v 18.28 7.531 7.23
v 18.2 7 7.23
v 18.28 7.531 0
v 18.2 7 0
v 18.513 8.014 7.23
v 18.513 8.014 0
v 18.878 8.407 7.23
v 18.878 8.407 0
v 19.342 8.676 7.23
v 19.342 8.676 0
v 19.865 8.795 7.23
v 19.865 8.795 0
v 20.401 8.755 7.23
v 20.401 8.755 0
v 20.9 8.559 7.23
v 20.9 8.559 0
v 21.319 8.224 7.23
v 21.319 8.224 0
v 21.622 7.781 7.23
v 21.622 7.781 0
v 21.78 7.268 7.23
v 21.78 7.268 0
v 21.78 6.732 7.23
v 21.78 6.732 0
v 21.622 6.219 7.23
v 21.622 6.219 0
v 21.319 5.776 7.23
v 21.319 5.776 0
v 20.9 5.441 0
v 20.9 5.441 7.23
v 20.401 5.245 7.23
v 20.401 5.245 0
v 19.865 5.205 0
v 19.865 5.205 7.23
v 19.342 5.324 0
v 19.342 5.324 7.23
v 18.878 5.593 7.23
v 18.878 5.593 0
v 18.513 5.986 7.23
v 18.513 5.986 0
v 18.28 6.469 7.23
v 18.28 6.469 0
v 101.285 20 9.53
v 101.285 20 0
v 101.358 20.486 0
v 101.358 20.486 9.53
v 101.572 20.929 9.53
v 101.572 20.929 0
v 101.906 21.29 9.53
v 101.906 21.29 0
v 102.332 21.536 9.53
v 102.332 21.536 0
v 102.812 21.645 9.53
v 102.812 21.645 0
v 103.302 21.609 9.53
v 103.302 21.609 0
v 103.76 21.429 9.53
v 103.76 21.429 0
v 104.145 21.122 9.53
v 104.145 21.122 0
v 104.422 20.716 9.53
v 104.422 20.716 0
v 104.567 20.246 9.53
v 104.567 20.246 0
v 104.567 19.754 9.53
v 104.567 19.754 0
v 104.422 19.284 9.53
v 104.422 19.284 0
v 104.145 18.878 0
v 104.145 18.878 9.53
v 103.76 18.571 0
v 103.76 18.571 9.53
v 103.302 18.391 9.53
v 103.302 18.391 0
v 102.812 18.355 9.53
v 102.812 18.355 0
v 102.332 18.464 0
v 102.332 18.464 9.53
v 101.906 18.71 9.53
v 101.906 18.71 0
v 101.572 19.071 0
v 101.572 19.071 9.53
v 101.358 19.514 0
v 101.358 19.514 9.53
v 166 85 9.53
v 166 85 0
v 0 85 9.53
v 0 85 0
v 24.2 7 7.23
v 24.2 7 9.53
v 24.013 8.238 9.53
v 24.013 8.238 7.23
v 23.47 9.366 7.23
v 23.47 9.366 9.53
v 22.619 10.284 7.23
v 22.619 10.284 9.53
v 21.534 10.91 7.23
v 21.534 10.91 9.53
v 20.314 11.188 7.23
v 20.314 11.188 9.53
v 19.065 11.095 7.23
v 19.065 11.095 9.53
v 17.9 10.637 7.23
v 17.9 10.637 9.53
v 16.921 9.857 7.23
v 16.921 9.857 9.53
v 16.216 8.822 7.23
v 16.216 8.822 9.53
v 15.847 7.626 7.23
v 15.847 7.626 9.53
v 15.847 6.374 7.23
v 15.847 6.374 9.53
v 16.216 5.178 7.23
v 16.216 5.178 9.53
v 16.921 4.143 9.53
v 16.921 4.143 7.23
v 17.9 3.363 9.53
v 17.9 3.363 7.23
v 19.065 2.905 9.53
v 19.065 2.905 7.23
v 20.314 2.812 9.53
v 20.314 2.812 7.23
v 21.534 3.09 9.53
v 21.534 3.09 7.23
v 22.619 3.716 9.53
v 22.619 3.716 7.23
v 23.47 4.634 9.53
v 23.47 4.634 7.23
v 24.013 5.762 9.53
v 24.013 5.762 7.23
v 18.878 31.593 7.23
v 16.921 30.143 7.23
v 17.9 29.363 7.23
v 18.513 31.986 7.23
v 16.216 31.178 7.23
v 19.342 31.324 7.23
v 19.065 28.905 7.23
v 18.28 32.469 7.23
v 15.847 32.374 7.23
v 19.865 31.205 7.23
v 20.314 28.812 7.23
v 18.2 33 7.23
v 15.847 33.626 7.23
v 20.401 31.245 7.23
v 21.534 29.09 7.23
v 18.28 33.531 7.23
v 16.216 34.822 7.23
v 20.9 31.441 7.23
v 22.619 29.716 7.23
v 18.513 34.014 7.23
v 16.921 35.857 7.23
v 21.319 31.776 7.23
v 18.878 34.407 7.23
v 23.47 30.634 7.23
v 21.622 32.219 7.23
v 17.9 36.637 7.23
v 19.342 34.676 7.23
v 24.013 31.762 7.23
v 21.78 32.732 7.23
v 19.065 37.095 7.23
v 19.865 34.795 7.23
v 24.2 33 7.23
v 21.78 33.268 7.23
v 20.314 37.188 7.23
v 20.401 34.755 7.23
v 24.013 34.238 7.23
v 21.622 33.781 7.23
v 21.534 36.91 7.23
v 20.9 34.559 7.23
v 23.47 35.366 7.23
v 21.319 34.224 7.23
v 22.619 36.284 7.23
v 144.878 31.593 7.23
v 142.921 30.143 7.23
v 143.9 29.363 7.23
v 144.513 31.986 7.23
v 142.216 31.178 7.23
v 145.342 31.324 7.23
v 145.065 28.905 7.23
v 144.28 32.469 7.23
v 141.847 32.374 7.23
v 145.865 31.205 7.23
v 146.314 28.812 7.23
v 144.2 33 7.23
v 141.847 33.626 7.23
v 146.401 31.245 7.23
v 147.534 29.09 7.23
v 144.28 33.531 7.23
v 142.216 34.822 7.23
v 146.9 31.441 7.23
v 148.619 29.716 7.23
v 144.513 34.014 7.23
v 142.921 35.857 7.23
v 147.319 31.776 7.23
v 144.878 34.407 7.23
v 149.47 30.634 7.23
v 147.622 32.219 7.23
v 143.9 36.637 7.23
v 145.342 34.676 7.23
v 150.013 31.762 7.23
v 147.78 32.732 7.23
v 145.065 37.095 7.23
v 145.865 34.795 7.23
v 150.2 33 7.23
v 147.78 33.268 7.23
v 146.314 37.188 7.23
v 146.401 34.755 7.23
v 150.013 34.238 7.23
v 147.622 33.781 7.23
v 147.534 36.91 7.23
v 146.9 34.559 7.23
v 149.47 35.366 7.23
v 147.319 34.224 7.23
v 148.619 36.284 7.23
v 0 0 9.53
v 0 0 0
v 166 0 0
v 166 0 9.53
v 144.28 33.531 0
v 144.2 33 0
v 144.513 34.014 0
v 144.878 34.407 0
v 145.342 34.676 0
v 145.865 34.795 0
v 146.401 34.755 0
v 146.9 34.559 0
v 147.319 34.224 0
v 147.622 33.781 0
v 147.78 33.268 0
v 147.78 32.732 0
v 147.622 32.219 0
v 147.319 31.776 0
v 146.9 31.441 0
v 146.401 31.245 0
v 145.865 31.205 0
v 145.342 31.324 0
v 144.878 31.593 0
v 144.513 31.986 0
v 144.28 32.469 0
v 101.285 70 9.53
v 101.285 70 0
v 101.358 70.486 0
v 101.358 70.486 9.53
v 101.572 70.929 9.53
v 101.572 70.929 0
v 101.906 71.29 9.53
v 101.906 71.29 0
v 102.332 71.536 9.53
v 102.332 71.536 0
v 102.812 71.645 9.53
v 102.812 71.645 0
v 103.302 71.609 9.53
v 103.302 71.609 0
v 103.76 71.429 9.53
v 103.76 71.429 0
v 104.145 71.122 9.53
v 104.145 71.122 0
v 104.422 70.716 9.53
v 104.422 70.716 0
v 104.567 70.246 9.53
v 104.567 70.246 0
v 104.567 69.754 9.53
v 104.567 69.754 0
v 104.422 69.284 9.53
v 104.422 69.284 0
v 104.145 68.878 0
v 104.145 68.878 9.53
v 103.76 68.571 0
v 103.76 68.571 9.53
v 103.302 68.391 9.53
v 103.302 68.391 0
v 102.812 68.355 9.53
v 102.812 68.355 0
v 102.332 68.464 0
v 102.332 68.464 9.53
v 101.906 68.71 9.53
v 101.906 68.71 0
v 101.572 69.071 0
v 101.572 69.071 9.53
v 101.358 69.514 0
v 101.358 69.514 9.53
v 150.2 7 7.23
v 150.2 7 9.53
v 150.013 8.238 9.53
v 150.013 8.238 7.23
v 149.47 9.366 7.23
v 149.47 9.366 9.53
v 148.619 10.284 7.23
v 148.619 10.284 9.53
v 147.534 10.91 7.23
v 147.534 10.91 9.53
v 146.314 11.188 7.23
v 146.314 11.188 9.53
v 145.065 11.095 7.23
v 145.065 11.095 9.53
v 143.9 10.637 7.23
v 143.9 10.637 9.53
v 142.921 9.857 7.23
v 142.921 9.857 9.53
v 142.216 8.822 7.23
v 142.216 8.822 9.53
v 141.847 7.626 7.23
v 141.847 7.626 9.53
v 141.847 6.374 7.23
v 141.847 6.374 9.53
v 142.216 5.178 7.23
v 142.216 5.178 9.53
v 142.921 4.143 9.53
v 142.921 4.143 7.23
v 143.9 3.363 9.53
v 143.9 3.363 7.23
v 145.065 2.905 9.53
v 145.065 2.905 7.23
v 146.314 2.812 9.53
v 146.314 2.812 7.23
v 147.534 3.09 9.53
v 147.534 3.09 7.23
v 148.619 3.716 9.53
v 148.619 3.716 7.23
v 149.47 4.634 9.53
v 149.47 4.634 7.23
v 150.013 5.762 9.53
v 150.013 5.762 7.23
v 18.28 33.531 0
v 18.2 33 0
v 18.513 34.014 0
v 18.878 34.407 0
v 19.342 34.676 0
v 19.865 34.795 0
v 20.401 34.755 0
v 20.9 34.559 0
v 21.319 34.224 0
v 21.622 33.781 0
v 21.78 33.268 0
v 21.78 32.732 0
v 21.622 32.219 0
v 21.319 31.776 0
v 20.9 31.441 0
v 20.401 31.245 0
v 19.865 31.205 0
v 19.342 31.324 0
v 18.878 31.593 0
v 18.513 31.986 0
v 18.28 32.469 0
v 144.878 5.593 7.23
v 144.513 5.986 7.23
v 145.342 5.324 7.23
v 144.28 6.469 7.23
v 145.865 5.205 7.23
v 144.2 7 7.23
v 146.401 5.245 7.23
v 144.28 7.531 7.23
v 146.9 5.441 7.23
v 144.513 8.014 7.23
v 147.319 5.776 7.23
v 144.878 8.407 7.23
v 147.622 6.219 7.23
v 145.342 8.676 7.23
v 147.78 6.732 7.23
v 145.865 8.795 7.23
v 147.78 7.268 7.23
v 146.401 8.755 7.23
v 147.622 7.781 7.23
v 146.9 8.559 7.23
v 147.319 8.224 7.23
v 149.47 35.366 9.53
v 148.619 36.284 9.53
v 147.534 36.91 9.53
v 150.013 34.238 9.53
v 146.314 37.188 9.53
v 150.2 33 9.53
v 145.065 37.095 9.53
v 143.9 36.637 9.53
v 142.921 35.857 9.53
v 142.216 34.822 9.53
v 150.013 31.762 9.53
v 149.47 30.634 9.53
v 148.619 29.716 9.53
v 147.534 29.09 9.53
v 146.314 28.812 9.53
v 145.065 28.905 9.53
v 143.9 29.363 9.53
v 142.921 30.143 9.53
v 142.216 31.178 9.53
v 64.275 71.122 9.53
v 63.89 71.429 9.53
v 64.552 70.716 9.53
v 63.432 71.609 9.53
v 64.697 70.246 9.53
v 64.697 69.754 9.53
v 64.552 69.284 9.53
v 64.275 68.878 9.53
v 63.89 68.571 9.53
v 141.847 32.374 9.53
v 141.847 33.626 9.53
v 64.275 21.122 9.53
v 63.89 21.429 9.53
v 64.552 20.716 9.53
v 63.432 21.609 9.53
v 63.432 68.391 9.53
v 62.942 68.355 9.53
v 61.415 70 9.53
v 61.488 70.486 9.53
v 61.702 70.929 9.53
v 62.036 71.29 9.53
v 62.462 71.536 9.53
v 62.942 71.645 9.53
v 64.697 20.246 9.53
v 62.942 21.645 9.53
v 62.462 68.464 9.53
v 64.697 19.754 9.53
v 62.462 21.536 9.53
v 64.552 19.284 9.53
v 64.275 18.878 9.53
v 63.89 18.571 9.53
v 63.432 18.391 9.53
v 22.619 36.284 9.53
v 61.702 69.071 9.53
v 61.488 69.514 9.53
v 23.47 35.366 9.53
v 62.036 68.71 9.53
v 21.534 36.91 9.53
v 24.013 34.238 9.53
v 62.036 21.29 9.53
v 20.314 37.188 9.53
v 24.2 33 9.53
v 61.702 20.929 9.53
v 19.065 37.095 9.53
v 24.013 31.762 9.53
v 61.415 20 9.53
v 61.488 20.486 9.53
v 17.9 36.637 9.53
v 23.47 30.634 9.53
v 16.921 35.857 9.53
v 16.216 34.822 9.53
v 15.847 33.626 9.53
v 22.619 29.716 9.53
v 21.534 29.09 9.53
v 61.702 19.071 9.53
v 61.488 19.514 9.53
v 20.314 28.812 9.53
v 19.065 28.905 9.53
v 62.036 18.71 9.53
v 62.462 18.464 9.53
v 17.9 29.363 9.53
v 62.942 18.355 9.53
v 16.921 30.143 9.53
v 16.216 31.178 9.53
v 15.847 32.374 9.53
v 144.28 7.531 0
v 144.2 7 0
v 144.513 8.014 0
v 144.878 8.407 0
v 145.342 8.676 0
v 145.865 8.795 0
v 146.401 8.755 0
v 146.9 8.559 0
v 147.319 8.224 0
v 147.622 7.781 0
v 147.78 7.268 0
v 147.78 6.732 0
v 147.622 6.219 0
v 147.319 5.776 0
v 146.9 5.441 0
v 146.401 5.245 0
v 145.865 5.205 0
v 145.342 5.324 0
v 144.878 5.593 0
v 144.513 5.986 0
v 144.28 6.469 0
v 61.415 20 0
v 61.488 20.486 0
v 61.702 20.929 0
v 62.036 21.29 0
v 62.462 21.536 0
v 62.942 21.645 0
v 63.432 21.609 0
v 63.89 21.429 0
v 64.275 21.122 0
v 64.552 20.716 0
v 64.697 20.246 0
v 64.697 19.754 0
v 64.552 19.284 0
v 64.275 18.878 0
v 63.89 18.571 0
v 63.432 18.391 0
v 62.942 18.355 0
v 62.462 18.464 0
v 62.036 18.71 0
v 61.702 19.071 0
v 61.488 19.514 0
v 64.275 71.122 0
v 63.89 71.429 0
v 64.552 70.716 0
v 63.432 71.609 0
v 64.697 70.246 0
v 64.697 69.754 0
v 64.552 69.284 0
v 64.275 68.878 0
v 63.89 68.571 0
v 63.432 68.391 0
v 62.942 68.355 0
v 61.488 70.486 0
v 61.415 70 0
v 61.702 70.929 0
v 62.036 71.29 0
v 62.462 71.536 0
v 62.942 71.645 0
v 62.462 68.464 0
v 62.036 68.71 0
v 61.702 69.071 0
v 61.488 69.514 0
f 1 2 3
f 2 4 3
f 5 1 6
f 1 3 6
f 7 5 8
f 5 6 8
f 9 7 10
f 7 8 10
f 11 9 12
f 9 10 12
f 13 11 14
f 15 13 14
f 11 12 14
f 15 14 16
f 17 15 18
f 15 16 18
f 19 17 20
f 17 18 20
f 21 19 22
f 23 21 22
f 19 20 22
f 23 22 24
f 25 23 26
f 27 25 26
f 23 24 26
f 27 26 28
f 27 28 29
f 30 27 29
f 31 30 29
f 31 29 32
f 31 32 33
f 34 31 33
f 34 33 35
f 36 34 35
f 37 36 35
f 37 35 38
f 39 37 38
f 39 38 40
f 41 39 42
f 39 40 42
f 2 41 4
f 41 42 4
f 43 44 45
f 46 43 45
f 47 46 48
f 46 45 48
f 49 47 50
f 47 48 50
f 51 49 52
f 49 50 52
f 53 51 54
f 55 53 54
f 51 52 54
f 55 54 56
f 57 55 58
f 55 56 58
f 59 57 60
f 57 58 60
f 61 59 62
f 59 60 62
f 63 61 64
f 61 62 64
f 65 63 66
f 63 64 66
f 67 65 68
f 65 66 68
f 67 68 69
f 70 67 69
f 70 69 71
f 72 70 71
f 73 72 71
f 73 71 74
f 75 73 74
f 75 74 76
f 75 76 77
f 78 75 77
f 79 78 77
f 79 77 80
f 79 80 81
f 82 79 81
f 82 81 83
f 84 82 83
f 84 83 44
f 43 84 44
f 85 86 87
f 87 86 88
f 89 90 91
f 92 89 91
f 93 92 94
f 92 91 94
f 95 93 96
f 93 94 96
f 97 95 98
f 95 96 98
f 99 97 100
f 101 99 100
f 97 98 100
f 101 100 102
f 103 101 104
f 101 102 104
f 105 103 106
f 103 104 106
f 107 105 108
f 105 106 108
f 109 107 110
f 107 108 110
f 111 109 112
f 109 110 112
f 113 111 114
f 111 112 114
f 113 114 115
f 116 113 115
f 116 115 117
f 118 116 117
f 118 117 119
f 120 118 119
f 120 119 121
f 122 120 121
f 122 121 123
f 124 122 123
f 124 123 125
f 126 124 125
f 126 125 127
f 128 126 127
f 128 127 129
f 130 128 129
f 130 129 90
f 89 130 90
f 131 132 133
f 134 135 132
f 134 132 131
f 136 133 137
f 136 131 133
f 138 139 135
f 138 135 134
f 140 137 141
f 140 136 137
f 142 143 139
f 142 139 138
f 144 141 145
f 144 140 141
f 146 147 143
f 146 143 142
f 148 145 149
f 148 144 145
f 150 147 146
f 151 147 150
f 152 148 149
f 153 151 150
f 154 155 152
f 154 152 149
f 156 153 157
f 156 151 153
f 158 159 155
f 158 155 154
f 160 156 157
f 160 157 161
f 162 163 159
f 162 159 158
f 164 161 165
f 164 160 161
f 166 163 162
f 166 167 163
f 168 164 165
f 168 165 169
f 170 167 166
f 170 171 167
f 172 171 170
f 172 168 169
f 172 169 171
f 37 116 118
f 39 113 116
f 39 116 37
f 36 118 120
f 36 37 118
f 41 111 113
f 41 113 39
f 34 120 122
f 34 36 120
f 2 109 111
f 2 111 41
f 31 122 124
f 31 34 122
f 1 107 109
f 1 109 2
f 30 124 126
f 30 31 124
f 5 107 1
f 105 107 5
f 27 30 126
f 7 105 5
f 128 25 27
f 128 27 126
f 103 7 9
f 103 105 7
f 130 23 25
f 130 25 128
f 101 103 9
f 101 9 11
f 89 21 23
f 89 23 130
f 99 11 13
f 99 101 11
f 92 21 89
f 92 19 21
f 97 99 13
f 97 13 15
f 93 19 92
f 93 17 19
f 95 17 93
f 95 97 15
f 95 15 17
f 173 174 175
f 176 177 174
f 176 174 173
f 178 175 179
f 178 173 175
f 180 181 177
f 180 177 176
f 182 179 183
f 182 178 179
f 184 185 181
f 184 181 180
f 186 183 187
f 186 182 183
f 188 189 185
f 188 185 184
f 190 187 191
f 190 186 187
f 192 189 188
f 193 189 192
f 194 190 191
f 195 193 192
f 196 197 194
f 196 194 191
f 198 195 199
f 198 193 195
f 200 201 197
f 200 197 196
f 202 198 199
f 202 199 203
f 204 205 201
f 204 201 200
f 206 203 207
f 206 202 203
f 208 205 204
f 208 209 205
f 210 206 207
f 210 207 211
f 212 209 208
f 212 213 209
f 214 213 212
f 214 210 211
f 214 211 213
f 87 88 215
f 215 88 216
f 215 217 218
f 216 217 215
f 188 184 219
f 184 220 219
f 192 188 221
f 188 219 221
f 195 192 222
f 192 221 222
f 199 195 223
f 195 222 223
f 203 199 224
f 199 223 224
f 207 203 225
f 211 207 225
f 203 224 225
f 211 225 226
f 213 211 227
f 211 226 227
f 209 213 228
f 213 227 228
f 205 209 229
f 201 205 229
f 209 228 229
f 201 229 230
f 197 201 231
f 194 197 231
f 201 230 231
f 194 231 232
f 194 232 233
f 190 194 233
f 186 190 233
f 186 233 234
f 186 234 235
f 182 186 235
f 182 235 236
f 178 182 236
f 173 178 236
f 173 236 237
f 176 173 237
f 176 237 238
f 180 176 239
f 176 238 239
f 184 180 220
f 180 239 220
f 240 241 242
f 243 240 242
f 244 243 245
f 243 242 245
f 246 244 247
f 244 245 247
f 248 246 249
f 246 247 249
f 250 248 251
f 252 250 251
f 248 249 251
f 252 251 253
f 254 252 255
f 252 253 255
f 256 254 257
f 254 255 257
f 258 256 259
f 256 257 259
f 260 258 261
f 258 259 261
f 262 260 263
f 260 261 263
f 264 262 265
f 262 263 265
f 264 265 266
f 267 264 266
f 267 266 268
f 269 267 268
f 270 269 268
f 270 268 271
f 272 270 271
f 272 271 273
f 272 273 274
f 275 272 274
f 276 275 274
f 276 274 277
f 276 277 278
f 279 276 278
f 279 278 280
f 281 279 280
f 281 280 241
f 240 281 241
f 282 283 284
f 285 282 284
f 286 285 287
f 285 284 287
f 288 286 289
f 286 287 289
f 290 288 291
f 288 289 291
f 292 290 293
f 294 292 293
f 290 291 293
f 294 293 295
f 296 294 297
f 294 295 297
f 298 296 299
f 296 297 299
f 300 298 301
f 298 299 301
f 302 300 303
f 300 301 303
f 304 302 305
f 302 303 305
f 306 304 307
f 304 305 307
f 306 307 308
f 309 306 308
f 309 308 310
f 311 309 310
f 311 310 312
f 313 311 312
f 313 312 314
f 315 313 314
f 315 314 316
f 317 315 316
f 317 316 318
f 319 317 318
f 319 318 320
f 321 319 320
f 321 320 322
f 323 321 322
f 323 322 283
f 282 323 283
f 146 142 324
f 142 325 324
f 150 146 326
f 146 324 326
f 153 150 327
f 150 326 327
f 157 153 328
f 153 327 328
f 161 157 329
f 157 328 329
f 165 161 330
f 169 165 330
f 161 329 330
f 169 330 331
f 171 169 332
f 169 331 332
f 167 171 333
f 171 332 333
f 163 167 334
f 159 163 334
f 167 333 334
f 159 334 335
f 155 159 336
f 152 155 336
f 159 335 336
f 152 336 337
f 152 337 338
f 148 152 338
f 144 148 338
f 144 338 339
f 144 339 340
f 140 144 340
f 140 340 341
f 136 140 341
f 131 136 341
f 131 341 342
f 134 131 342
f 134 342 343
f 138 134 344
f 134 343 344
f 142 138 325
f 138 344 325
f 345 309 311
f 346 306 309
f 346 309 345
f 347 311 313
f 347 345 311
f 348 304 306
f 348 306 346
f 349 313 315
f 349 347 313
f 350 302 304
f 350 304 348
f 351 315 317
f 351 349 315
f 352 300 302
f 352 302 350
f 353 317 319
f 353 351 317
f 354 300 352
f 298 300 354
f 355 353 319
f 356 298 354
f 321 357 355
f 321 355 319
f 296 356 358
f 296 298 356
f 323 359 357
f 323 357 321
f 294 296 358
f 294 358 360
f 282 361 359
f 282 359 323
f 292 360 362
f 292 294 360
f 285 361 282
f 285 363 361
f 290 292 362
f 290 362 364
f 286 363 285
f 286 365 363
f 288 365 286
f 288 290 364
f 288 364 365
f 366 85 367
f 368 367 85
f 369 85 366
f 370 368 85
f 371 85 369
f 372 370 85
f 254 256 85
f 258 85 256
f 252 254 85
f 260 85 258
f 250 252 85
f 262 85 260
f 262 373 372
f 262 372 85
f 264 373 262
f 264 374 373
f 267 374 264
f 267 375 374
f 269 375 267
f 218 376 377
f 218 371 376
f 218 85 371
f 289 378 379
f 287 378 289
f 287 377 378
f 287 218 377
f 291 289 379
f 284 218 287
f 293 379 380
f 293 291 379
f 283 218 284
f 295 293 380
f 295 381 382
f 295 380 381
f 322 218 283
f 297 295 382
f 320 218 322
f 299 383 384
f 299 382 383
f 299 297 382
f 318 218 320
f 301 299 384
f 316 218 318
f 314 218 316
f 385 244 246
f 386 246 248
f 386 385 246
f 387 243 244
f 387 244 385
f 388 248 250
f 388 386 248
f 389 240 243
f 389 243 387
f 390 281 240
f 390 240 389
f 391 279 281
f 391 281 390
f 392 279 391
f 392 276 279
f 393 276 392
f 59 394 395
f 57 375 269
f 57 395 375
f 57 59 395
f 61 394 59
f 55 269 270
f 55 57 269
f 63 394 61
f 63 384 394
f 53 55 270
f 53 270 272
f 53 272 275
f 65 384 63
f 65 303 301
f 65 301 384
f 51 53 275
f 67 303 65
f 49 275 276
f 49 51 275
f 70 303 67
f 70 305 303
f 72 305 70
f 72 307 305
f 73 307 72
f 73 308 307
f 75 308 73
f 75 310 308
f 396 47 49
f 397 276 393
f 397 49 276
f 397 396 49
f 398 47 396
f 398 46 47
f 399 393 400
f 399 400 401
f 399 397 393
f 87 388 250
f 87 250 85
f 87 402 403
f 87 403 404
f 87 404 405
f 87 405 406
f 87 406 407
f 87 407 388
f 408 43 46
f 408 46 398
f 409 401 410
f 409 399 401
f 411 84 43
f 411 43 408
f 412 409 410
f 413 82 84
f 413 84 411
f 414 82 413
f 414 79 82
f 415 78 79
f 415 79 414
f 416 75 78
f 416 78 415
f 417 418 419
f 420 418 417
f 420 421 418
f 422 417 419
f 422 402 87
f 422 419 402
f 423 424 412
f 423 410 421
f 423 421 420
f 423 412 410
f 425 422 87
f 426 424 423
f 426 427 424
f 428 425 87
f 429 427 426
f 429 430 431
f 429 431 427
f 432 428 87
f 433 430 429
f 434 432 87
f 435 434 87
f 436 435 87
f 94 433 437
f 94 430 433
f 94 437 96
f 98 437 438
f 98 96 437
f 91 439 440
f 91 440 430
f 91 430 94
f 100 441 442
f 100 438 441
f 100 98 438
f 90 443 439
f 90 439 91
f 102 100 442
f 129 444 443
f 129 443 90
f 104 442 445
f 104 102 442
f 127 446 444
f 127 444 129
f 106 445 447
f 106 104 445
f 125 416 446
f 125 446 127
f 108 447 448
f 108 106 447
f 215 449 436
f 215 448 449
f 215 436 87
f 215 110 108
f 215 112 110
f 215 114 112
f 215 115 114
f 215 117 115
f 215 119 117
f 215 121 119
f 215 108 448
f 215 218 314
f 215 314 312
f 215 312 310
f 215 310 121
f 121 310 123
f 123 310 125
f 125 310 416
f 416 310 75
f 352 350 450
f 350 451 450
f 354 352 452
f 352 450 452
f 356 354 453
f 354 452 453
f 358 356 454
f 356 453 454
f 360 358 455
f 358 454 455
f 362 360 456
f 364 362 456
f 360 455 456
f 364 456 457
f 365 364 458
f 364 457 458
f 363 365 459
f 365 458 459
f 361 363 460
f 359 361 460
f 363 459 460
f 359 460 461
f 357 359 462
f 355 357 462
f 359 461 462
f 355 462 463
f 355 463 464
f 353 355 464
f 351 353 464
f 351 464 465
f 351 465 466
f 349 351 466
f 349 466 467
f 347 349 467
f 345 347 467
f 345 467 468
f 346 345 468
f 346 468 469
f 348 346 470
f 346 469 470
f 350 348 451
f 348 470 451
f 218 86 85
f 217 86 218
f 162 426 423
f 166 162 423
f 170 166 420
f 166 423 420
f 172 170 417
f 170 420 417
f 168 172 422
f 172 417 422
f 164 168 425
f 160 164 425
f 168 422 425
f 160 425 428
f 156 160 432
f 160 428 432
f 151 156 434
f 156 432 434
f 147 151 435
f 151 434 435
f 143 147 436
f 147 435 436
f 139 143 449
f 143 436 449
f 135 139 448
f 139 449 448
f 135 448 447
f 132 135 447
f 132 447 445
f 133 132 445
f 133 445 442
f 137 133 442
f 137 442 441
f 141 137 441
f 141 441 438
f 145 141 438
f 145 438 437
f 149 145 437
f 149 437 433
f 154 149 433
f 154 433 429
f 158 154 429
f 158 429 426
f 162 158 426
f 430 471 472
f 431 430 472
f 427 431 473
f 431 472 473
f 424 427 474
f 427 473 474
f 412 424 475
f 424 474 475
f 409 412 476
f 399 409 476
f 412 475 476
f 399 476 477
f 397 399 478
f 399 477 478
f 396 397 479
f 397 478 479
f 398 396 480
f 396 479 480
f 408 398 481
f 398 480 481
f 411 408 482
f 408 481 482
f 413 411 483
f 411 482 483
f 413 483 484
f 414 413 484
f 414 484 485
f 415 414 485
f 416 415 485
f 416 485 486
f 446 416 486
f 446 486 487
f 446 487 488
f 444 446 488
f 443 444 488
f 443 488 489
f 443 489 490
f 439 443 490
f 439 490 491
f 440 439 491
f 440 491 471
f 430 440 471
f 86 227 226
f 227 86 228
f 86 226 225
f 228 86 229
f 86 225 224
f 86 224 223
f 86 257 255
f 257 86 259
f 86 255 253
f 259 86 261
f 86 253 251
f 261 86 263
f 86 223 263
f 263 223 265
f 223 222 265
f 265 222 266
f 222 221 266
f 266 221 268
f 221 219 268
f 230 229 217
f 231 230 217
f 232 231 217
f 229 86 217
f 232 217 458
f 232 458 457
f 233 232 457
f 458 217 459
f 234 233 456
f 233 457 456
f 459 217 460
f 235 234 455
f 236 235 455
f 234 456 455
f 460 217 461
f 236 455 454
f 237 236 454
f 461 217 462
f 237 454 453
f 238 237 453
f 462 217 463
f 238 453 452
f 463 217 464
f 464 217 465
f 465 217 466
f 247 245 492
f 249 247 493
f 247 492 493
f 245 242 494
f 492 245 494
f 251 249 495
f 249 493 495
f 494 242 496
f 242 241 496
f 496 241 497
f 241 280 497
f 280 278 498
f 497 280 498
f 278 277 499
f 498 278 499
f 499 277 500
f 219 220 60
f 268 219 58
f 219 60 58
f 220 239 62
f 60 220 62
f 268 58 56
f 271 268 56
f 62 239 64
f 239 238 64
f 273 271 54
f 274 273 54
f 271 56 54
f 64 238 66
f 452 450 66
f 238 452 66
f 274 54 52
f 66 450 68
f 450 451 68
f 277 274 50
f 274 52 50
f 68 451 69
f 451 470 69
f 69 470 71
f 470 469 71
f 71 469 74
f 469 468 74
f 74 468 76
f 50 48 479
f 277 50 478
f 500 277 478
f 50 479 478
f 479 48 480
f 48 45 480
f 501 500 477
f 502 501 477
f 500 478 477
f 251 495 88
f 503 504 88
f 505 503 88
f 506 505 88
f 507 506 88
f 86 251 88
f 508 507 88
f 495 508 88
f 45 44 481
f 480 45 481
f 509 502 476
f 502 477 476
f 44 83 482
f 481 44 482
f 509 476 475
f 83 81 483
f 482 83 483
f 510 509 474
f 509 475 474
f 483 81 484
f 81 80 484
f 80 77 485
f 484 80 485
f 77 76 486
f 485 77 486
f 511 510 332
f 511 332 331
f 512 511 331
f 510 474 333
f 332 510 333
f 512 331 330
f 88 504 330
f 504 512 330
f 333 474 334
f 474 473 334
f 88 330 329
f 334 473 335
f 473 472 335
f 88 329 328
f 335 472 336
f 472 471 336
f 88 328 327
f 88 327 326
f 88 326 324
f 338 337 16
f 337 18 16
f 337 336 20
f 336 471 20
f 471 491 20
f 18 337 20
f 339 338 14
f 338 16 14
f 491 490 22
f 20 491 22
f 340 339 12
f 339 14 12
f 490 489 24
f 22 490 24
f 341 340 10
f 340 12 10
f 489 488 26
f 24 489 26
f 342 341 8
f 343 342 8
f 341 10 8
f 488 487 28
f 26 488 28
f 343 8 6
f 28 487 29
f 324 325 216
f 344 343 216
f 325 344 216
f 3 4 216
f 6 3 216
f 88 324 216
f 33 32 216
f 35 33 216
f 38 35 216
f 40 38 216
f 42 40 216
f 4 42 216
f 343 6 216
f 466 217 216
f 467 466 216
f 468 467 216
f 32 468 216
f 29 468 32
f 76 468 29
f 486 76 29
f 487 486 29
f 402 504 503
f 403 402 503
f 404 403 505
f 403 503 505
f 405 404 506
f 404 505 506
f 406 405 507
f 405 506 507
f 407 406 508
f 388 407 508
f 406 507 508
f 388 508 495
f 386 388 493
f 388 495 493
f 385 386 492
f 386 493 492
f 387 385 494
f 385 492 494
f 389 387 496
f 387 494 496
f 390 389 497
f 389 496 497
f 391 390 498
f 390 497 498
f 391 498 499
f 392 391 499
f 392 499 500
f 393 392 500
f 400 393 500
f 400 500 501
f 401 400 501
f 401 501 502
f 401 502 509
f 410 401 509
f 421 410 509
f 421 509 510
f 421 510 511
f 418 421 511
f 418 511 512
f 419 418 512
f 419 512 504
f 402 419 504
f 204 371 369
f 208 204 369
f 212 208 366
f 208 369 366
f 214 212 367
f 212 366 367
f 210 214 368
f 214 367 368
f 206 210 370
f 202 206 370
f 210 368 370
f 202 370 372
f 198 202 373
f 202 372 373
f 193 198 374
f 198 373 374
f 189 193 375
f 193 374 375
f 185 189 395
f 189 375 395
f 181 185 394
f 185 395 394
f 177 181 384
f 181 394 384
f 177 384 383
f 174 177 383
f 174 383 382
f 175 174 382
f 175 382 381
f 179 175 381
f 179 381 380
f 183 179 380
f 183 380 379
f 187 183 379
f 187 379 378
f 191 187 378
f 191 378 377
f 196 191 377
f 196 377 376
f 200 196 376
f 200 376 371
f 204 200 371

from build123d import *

# Parameters (mm, degrees)
SKETCH1_W                                        = 166
SKETCH1_H                                        = 85
BOSS_EXTRUDE3_DEPTH                              = 9.53
CBORE_FOR_M3_HEX_HEAD_MACHINE_SCREW2_D           = 3.6
CBORE_FOR_M3_HEX_HEAD_MACHINE_SCREW2_CBORE_D     = 8.4
CBORE_FOR_M3_HEX_HEAD_MACHINE_SCREW2_CBORE_DEPTH = 2.3
M4X0_7_TAPPED_HOLE1_D                            = 3.3
M4X0_7_TAPPED_HOLE1_DEPTH                        = 10.1
M4X0_7_TAPPED_HOLE1_TIP                          = 0.991420021


with BuildPart() as part:
    # Sketch1 → Boss-Extrude3 (new body)
    with BuildSketch(Plane(origin=(0, 0, 0), x_dir=(-1, 0, 0), z_dir=(0, 0, 1))):
        with Locations((-83, -42.5)):
            Rectangle(SKETCH1_W, SKETCH1_H)
    extrude(amount=BOSS_EXTRUDE3_DEPTH)

    # CBORE for M3 Hex Head Machine Screw2 (through all)
    with Locations(Plane(origin=(20, 33, 9.53), x_dir=(1, 0, 0), z_dir=(0, 0, 1))):
        with Locations((0, 0), (0, -26), (126, 0), (126, -26)):
            CounterBoreHole(CBORE_FOR_M3_HEX_HEAD_MACHINE_SCREW2_D / 2, CBORE_FOR_M3_HEX_HEAD_MACHINE_SCREW2_CBORE_D / 2, CBORE_FOR_M3_HEX_HEAD_MACHINE_SCREW2_CBORE_DEPTH)

    # M4x0.7 Tapped Hole1
    with Locations(Plane(origin=(63.065, 70, 9.53), x_dir=(1, 0, 0), z_dir=(0, 0, 1))):
        with Locations((0, 0), (0, -50), (39.87, 0), (39.87, -50)):
            Hole(M4X0_7_TAPPED_HOLE1_D / 2, depth=M4X0_7_TAPPED_HOLE1_DEPTH)
            with Locations((0, 0, -(M4X0_7_TAPPED_HOLE1_DEPTH + M4X0_7_TAPPED_HOLE1_TIP / 2))):  # 118° drill point
                Cone(0, M4X0_7_TAPPED_HOLE1_D / 2, M4X0_7_TAPPED_HOLE1_TIP, mode=Mode.SUBTRACT)


solid = part.part
